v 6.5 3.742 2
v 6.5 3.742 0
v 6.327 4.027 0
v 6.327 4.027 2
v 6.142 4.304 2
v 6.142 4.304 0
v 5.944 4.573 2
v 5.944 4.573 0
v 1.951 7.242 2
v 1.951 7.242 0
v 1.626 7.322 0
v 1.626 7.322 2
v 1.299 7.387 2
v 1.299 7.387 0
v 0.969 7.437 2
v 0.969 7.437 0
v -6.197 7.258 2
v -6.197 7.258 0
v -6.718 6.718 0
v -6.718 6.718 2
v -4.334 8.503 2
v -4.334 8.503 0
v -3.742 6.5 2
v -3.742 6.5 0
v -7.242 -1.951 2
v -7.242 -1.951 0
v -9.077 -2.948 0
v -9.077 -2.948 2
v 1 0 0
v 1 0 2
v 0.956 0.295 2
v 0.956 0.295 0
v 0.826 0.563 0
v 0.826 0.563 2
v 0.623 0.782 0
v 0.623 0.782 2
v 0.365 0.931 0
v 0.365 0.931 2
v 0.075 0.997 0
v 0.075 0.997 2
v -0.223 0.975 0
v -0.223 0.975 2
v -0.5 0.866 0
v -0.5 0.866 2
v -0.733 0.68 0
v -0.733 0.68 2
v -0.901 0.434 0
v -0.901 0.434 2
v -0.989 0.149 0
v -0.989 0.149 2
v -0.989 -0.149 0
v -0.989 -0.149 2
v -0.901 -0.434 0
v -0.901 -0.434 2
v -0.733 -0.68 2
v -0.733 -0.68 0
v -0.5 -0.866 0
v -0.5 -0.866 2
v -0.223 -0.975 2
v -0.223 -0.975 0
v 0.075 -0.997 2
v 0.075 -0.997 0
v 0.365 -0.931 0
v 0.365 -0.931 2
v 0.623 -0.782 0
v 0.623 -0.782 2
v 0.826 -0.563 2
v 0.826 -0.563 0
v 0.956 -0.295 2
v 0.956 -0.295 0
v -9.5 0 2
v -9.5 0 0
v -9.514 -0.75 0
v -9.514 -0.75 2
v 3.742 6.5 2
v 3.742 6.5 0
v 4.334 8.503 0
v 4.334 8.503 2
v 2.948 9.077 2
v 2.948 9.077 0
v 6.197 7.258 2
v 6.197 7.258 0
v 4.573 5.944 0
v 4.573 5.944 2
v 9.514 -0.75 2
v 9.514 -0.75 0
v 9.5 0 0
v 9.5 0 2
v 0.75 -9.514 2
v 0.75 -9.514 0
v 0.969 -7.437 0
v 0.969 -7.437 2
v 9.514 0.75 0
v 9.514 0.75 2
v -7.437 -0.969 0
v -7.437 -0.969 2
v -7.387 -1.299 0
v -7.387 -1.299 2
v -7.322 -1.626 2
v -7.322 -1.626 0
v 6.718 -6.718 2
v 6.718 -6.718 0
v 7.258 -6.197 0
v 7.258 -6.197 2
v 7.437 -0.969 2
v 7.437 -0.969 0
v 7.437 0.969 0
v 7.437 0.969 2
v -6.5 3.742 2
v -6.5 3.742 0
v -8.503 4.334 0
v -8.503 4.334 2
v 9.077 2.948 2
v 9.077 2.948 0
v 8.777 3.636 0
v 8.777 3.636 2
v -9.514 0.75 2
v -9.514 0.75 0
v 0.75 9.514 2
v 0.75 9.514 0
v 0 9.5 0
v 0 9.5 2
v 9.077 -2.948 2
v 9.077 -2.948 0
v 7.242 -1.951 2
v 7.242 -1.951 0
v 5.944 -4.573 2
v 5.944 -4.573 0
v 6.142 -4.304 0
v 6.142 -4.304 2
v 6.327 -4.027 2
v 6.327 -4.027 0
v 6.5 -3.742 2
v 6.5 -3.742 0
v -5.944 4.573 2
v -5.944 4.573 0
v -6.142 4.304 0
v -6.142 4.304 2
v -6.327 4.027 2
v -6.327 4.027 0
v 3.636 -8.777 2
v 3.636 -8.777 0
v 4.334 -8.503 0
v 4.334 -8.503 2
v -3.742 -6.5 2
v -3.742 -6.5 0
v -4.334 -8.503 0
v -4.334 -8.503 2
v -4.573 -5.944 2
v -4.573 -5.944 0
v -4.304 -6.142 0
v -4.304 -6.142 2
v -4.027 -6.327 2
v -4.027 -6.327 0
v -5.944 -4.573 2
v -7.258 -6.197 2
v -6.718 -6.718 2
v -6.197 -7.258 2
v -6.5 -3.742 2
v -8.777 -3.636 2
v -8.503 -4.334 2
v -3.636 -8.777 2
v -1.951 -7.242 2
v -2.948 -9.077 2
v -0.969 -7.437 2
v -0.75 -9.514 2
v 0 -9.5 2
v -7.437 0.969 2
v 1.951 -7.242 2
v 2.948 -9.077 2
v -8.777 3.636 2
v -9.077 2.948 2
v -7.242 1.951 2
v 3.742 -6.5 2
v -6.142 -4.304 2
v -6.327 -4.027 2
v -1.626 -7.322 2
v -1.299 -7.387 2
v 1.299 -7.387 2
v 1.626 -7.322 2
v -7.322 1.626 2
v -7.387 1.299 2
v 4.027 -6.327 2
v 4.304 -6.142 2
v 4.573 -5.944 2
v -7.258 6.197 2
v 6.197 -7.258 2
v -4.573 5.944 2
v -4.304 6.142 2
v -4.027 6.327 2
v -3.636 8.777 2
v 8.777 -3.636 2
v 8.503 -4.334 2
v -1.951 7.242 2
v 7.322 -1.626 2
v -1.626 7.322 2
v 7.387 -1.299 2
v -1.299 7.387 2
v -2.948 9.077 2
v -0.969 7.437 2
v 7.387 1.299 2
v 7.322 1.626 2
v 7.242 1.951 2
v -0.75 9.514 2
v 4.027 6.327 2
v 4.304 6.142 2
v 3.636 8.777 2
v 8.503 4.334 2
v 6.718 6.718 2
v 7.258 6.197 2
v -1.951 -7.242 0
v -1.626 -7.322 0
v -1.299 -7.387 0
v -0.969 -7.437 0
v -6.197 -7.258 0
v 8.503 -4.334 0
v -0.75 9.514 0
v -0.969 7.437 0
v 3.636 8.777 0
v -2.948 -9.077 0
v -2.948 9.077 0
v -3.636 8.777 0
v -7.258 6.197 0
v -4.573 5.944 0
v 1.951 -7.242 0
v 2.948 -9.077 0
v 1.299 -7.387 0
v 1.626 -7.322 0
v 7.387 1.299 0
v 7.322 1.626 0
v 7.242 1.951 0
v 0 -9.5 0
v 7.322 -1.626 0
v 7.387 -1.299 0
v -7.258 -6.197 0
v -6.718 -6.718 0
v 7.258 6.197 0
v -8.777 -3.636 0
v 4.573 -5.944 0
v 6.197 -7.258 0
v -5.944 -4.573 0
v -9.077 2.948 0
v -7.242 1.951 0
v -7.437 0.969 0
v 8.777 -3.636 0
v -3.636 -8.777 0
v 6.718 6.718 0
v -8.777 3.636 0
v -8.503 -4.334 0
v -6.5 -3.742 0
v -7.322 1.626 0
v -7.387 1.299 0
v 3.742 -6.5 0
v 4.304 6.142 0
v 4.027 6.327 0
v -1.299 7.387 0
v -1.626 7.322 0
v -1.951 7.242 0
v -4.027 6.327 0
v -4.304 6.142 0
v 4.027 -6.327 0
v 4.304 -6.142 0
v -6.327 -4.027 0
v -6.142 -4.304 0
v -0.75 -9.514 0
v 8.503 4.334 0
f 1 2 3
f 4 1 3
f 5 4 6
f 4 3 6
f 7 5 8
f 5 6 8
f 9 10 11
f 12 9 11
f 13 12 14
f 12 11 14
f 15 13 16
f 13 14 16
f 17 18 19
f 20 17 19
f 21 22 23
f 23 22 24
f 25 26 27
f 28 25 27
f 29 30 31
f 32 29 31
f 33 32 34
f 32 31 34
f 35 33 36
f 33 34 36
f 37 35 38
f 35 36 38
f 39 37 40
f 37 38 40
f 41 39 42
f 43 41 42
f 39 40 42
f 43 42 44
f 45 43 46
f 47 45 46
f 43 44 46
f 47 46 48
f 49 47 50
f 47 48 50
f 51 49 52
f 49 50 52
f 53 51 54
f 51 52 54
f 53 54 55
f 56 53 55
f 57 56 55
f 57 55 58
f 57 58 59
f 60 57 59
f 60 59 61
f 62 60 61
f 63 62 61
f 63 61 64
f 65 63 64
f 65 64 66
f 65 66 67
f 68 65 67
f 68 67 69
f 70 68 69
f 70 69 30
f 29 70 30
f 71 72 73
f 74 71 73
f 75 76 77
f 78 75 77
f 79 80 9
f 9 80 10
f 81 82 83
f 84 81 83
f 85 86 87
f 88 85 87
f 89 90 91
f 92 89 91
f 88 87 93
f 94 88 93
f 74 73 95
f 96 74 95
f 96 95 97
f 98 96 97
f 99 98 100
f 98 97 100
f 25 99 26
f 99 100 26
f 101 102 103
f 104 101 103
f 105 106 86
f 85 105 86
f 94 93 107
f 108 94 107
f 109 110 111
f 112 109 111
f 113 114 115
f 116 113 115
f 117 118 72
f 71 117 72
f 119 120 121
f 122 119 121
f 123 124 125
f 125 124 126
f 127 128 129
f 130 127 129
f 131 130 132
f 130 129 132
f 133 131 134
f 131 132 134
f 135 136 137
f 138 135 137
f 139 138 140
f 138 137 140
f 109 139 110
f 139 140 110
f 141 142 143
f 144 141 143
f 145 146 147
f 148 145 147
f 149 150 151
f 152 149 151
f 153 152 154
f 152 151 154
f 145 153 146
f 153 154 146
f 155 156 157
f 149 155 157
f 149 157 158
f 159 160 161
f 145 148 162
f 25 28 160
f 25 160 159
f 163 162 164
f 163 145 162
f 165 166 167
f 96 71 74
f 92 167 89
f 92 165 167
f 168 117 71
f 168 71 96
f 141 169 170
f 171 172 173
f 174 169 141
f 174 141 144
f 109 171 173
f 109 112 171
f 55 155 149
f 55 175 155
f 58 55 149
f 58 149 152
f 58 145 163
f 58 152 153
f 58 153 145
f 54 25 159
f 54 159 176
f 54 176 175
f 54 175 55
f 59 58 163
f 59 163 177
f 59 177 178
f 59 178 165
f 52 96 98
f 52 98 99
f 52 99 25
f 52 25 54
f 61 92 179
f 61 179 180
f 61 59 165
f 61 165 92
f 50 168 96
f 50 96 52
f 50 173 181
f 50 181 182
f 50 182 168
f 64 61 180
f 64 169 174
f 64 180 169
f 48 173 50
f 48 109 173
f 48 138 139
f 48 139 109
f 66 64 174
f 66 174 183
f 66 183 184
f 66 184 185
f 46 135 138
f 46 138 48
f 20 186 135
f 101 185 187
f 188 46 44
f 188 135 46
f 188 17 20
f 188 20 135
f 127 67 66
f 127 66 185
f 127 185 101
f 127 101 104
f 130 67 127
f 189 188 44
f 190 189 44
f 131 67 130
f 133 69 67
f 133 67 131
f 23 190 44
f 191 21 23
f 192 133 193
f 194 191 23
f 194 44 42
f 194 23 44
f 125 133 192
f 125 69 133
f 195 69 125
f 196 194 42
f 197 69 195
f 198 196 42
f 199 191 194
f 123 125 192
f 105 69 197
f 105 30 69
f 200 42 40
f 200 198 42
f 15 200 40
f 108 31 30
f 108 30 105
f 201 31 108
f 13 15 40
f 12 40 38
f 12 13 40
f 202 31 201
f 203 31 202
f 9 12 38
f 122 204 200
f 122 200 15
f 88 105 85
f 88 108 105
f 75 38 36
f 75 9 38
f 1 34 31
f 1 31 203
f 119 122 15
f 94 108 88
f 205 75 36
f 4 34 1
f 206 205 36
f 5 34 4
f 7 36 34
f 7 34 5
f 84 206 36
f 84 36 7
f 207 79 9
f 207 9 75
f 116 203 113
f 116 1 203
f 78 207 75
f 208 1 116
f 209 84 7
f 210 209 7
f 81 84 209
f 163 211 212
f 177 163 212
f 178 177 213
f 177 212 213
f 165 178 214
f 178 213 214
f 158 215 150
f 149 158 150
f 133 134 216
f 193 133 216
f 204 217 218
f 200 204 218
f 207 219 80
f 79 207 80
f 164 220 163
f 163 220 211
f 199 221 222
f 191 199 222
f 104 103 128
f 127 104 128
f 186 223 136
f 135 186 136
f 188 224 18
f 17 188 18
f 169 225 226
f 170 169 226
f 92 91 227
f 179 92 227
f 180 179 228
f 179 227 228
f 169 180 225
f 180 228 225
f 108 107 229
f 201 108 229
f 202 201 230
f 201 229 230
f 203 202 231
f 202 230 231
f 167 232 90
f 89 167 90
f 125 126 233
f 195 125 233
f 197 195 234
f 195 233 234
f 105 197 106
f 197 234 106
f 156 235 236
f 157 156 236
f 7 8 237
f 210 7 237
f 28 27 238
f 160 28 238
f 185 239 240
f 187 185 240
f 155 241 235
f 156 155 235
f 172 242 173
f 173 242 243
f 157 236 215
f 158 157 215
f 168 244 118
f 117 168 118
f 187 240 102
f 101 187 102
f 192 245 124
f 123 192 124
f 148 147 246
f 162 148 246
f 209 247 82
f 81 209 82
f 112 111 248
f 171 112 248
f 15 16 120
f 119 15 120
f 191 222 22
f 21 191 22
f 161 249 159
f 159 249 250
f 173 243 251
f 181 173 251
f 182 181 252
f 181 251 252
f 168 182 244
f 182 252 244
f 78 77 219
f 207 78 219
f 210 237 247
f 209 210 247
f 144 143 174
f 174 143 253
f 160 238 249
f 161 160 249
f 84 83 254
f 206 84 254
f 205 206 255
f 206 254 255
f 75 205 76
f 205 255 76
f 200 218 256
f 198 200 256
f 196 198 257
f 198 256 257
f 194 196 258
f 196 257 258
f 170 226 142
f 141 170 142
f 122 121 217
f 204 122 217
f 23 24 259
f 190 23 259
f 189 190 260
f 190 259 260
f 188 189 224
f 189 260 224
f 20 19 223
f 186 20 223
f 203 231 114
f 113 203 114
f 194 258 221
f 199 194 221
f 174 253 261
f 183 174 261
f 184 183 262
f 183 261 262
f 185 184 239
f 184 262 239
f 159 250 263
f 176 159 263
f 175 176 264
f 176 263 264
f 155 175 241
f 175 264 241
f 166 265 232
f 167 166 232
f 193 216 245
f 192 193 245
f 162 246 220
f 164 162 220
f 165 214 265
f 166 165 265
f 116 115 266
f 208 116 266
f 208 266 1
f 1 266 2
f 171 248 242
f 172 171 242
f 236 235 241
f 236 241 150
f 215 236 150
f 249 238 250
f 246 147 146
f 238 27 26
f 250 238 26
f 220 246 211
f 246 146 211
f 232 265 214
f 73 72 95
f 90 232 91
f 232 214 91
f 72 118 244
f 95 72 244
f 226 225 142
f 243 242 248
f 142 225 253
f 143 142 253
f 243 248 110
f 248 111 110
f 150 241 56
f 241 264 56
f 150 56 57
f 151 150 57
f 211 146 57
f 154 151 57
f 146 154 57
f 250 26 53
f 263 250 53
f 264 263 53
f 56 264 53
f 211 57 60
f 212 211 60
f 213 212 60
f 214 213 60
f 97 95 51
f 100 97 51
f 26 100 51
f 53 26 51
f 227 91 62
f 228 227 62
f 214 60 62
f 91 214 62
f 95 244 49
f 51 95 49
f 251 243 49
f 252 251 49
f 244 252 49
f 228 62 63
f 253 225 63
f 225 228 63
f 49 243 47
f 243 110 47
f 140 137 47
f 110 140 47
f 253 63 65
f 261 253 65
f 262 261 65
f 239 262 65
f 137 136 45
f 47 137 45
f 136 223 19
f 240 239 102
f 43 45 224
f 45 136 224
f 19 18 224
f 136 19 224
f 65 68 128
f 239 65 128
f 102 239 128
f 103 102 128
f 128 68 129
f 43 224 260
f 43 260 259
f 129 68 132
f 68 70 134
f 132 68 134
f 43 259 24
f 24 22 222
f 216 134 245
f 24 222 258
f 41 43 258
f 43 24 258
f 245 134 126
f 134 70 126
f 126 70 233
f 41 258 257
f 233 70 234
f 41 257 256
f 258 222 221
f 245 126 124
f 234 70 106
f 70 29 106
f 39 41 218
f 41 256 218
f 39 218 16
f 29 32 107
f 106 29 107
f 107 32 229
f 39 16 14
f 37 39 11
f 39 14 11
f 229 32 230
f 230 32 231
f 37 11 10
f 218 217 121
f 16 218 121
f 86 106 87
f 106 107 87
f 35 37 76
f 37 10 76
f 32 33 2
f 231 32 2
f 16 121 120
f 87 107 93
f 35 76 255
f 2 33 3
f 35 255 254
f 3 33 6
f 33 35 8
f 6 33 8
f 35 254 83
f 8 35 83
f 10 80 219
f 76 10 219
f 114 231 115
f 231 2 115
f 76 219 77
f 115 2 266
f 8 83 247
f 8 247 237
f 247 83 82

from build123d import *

# Parameters (mm, degrees)
F1_DEPTH = 2
F2_R     = 1
F3_DEPTH = 2.001


with BuildPart() as f1:
    # F0 (on Top) → F1 (new body)
    with BuildSketch(Plane.XY):
        with BuildLine():
            ThreePointArc((7.437103, -0.969279), (7.484259, -0.485659), (7.5, 0))
            ThreePointArc((7.5, 0), (7.484259, 0.485659), (7.437103, 0.969279))
            ThreePointArc((7.437103, 0.969279), (7.35589, 1.463177), (7.241914, 1.950559))
            ThreePointArc((7.241914, 1.950559), (6.929096, 2.870126), (6.50006, 3.741553))
            ThreePointArc((6.50006, 3.741553), (6.236022, 4.166777), (5.94421, 4.573442))
            ThreePointArc((5.94421, 4.573442), (5.303301, 5.303301), (4.573442, 5.94421))
            ThreePointArc((4.573442, 5.94421), (4.166777, 6.236022), (3.741553, 6.50006))
            ThreePointArc((3.741553, 6.50006), (2.870126, 6.929096), (1.950559, 7.241914))
            ThreePointArc((1.950559, 7.241914), (1.463177, 7.35589), (0.969279, 7.437103))
            ThreePointArc((0.969279, 7.437103), (0, 7.5), (-0.969279, 7.437103))
            ThreePointArc((-0.969279, 7.437103), (-1.463177, 7.35589), (-1.950559, 7.241914))
            ThreePointArc((-1.950559, 7.241914), (-2.870126, 6.929096), (-3.741553, 6.50006))
            ThreePointArc((-3.741553, 6.50006), (-4.166777, 6.236022), (-4.573442, 5.94421))
            ThreePointArc((-4.573442, 5.94421), (-5.303301, 5.303301), (-5.94421, 4.573442))
            ThreePointArc((-5.94421, 4.573442), (-6.236022, 4.166777), (-6.50006, 3.741553))
            ThreePointArc((-6.50006, 3.741553), (-6.929096, 2.870126), (-7.241914, 1.950559))
            ThreePointArc((-7.241914, 1.950559), (-7.35589, 1.463177), (-7.437103, 0.969279))
            ThreePointArc((-7.437103, 0.969279), (-7.5, 0), (-7.437103, -0.969279))
            ThreePointArc((-7.437103, -0.969279), (-7.35589, -1.463177), (-7.241914, -1.950559))
            ThreePointArc((-7.241914, -1.950559), (-6.929096, -2.870126), (-6.50006, -3.741553))
            ThreePointArc((-6.50006, -3.741553), (-6.236022, -4.166777), (-5.94421, -4.573442))
            ThreePointArc((-5.94421, -4.573442), (-5.303301, -5.303301), (-4.573442, -5.94421))
            ThreePointArc((-4.573442, -5.94421), (-4.166777, -6.236022), (-3.741553, -6.50006))
            ThreePointArc((-3.741553, -6.50006), (-2.870126, -6.929096), (-1.950559, -7.241914))
            ThreePointArc((-1.950559, -7.241914), (-1.463177, -7.35589), (-0.969279, -7.437103))
            ThreePointArc((-0.969279, -7.437103), (0, -7.5), (0.969279, -7.437103))
            ThreePointArc((0.969279, -7.437103), (1.463177, -7.35589), (1.950559, -7.241914))
            ThreePointArc((1.950559, -7.241914), (2.870126, -6.929096), (3.741553, -6.50006))
            ThreePointArc((3.741553, -6.50006), (4.166777, -6.236022), (4.573442, -5.94421))
            ThreePointArc((4.573442, -5.94421), (5.303301, -5.303301), (5.94421, -4.573442))
            ThreePointArc((5.94421, -4.573442), (6.236022, -4.166777), (6.50006, -3.741553))
            ThreePointArc((6.50006, -3.741553), (6.929096, -2.870126), (7.241914, -1.950559))
            ThreePointArc((7.241914, -1.950559), (7.35589, -1.463177), (7.437103, -0.969279))
        make_face()
        with BuildLine():
            ThreePointArc((7.437103, 0.969279), (7.484259, 0.485659), (7.5, 0))
            ThreePointArc((7.5, 0), (7.484259, -0.485659), (7.437103, -0.969279))
            Line((7.437103, -0.969279), (9.513775, -0.75))
            Line((9.513775, -0.75), (9.500322, 0))
            Line((9.500322, 0), (9.513775, 0.75))
            Line((9.513775, 0.75), (7.437103, 0.969279))
        make_face()
        with BuildLine():
            ThreePointArc((6.50006, 3.741553), (6.929096, 2.870126), (7.241914, 1.950559))
            Line((7.241914, 1.950559), (9.076594, 2.947854))
            Line((9.076594, 2.947854), (8.777153, 3.635616))
            Line((8.777153, 3.635616), (8.502569, 4.333674))
            Line((8.502569, 4.333674), (6.50006, 3.741553))
        make_face()
        with BuildLine():
            Line((9.076594, -2.947854), (7.241914, -1.950559))
            ThreePointArc((7.241914, -1.950559), (6.929096, -2.870126), (6.50006, -3.741553))
            Line((6.50006, -3.741553), (8.502569, -4.333674))
            Line((8.502569, -4.333674), (8.777153, -3.635616))
            Line((8.777153, -3.635616), (9.076594, -2.947854))
        make_face()
        with BuildLine():
            ThreePointArc((4.573442, 5.94421), (5.303301, 5.303301), (5.94421, 4.573442))
            Line((5.94421, 4.573442), (7.257585, 6.196924))
            Line((7.257585, 6.196924), (6.717742, 6.717742))
            Line((6.717742, 6.717742), (6.196924, 7.257585))
            Line((6.196924, 7.257585), (4.573442, 5.94421))
        make_face()
        with BuildLine():
            Line((7.257585, -6.196924), (5.94421, -4.573442))
            ThreePointArc((5.94421, -4.573442), (5.303301, -5.303301), (4.573442, -5.94421))
            Line((4.573442, -5.94421), (6.196924, -7.257585))
            Line((6.196924, -7.257585), (6.717742, -6.717742))
            Line((6.717742, -6.717742), (7.257585, -6.196924))
        make_face()
        with BuildLine():
            ThreePointArc((1.950559, 7.241914), (2.870126, 6.929096), (3.741553, 6.50006))
            Line((3.741553, 6.50006), (4.333674, 8.502569))
            Line((4.333674, 8.502569), (3.635616, 8.777153))
            Line((3.635616, 8.777153), (2.947854, 9.076594))
            Line((2.947854, 9.076594), (1.950559, 7.241914))
        make_face()
        with BuildLine():
            Line((4.333674, -8.502569), (3.741553, -6.50006))
            ThreePointArc((3.741553, -6.50006), (2.870126, -6.929096), (1.950559, -7.241914))
            Line((1.950559, -7.241914), (2.947854, -9.076594))
            Line((2.947854, -9.076594), (3.635616, -8.777153))
            Line((3.635616, -8.777153), (4.333674, -8.502569))
        make_face()
        with BuildLine():
            ThreePointArc((-0.969279, 7.437103), (0, 7.5), (0.969279, 7.437103))
            Line((0.969279, 7.437103), (0.75, 9.513775))
            Line((0.75, 9.513775), (0, 9.500322))
            Line((0, 9.500322), (-0.75, 9.513775))
            Line((-0.75, 9.513775), (-0.969279, 7.437103))
        make_face()
        with BuildLine():
            Line((0.75, -9.513775), (0.969279, -7.437103))
            ThreePointArc((0.969279, -7.437103), (0, -7.5), (-0.969279, -7.437103))
            Line((-0.969279, -7.437103), (-0.75, -9.513775))
            Line((-0.75, -9.513775), (0, -9.500322))
            Line((0, -9.500322), (0.75, -9.513775))
        make_face()
        with BuildLine():
            ThreePointArc((-3.741553, 6.50006), (-2.870126, 6.929096), (-1.950559, 7.241914))
            Line((-1.950559, 7.241914), (-2.947854, 9.076594))
            Line((-2.947854, 9.076594), (-3.635616, 8.777153))
            Line((-3.635616, 8.777153), (-4.333674, 8.502569))
            Line((-4.333674, 8.502569), (-3.741553, 6.50006))
        make_face()
        with BuildLine():
            Line((-2.947854, -9.076594), (-1.950559, -7.241914))
            ThreePointArc((-1.950559, -7.241914), (-2.870126, -6.929096), (-3.741553, -6.50006))
            Line((-3.741553, -6.50006), (-4.333674, -8.502569))
            Line((-4.333674, -8.502569), (-3.635616, -8.777153))
            Line((-3.635616, -8.777153), (-2.947854, -9.076594))
        make_face()
        with BuildLine():
            ThreePointArc((-5.94421, 4.573442), (-5.303301, 5.303301), (-4.573442, 5.94421))
            Line((-4.573442, 5.94421), (-6.196924, 7.257585))
            Line((-6.196924, 7.257585), (-6.717742, 6.717742))
            Line((-6.717742, 6.717742), (-7.257585, 6.196924))
            Line((-7.257585, 6.196924), (-5.94421, 4.573442))
        make_face()
        with BuildLine():
            Line((-6.196924, -7.257585), (-4.573442, -5.94421))
            ThreePointArc((-4.573442, -5.94421), (-5.303301, -5.303301), (-5.94421, -4.573442))
            Line((-5.94421, -4.573442), (-7.257585, -6.196924))
            Line((-7.257585, -6.196924), (-6.717742, -6.717742))
            Line((-6.717742, -6.717742), (-6.196924, -7.257585))
        make_face()
        with BuildLine():
            ThreePointArc((-7.241914, 1.950559), (-6.929096, 2.870126), (-6.50006, 3.741553))
            Line((-6.50006, 3.741553), (-8.502569, 4.333674))
            Line((-8.502569, 4.333674), (-8.777153, 3.635616))
            Line((-8.777153, 3.635616), (-9.076594, 2.947854))
            Line((-9.076594, 2.947854), (-7.241914, 1.950559))
        make_face()
        with BuildLine():
            Line((-8.502569, -4.333674), (-6.50006, -3.741553))
            ThreePointArc((-6.50006, -3.741553), (-6.929096, -2.870126), (-7.241914, -1.950559))
            Line((-7.241914, -1.950559), (-9.076594, -2.947854))
            Line((-9.076594, -2.947854), (-8.777153, -3.635616))
            Line((-8.777153, -3.635616), (-8.502569, -4.333674))
        make_face()
        with BuildLine():
            ThreePointArc((-7.437103, -0.969279), (-7.5, 0), (-7.437103, 0.969279))
            Line((-7.437103, 0.969279), (-9.513775, 0.75))
            Line((-9.513775, 0.75), (-9.500322, 0))
            Line((-9.500322, 0), (-9.513775, -0.75))
            Line((-9.513775, -0.75), (-7.437103, -0.969279))
        make_face()
    extrude(amount=F1_DEPTH)

    # F2 (on face) → F3 (cut, through all)
    with BuildSketch(Plane.XY.offset(2)):
        Circle(F2_R)
    extrude(amount=-F3_DEPTH, mode=Mode.SUBTRACT)


solid = f1.part
